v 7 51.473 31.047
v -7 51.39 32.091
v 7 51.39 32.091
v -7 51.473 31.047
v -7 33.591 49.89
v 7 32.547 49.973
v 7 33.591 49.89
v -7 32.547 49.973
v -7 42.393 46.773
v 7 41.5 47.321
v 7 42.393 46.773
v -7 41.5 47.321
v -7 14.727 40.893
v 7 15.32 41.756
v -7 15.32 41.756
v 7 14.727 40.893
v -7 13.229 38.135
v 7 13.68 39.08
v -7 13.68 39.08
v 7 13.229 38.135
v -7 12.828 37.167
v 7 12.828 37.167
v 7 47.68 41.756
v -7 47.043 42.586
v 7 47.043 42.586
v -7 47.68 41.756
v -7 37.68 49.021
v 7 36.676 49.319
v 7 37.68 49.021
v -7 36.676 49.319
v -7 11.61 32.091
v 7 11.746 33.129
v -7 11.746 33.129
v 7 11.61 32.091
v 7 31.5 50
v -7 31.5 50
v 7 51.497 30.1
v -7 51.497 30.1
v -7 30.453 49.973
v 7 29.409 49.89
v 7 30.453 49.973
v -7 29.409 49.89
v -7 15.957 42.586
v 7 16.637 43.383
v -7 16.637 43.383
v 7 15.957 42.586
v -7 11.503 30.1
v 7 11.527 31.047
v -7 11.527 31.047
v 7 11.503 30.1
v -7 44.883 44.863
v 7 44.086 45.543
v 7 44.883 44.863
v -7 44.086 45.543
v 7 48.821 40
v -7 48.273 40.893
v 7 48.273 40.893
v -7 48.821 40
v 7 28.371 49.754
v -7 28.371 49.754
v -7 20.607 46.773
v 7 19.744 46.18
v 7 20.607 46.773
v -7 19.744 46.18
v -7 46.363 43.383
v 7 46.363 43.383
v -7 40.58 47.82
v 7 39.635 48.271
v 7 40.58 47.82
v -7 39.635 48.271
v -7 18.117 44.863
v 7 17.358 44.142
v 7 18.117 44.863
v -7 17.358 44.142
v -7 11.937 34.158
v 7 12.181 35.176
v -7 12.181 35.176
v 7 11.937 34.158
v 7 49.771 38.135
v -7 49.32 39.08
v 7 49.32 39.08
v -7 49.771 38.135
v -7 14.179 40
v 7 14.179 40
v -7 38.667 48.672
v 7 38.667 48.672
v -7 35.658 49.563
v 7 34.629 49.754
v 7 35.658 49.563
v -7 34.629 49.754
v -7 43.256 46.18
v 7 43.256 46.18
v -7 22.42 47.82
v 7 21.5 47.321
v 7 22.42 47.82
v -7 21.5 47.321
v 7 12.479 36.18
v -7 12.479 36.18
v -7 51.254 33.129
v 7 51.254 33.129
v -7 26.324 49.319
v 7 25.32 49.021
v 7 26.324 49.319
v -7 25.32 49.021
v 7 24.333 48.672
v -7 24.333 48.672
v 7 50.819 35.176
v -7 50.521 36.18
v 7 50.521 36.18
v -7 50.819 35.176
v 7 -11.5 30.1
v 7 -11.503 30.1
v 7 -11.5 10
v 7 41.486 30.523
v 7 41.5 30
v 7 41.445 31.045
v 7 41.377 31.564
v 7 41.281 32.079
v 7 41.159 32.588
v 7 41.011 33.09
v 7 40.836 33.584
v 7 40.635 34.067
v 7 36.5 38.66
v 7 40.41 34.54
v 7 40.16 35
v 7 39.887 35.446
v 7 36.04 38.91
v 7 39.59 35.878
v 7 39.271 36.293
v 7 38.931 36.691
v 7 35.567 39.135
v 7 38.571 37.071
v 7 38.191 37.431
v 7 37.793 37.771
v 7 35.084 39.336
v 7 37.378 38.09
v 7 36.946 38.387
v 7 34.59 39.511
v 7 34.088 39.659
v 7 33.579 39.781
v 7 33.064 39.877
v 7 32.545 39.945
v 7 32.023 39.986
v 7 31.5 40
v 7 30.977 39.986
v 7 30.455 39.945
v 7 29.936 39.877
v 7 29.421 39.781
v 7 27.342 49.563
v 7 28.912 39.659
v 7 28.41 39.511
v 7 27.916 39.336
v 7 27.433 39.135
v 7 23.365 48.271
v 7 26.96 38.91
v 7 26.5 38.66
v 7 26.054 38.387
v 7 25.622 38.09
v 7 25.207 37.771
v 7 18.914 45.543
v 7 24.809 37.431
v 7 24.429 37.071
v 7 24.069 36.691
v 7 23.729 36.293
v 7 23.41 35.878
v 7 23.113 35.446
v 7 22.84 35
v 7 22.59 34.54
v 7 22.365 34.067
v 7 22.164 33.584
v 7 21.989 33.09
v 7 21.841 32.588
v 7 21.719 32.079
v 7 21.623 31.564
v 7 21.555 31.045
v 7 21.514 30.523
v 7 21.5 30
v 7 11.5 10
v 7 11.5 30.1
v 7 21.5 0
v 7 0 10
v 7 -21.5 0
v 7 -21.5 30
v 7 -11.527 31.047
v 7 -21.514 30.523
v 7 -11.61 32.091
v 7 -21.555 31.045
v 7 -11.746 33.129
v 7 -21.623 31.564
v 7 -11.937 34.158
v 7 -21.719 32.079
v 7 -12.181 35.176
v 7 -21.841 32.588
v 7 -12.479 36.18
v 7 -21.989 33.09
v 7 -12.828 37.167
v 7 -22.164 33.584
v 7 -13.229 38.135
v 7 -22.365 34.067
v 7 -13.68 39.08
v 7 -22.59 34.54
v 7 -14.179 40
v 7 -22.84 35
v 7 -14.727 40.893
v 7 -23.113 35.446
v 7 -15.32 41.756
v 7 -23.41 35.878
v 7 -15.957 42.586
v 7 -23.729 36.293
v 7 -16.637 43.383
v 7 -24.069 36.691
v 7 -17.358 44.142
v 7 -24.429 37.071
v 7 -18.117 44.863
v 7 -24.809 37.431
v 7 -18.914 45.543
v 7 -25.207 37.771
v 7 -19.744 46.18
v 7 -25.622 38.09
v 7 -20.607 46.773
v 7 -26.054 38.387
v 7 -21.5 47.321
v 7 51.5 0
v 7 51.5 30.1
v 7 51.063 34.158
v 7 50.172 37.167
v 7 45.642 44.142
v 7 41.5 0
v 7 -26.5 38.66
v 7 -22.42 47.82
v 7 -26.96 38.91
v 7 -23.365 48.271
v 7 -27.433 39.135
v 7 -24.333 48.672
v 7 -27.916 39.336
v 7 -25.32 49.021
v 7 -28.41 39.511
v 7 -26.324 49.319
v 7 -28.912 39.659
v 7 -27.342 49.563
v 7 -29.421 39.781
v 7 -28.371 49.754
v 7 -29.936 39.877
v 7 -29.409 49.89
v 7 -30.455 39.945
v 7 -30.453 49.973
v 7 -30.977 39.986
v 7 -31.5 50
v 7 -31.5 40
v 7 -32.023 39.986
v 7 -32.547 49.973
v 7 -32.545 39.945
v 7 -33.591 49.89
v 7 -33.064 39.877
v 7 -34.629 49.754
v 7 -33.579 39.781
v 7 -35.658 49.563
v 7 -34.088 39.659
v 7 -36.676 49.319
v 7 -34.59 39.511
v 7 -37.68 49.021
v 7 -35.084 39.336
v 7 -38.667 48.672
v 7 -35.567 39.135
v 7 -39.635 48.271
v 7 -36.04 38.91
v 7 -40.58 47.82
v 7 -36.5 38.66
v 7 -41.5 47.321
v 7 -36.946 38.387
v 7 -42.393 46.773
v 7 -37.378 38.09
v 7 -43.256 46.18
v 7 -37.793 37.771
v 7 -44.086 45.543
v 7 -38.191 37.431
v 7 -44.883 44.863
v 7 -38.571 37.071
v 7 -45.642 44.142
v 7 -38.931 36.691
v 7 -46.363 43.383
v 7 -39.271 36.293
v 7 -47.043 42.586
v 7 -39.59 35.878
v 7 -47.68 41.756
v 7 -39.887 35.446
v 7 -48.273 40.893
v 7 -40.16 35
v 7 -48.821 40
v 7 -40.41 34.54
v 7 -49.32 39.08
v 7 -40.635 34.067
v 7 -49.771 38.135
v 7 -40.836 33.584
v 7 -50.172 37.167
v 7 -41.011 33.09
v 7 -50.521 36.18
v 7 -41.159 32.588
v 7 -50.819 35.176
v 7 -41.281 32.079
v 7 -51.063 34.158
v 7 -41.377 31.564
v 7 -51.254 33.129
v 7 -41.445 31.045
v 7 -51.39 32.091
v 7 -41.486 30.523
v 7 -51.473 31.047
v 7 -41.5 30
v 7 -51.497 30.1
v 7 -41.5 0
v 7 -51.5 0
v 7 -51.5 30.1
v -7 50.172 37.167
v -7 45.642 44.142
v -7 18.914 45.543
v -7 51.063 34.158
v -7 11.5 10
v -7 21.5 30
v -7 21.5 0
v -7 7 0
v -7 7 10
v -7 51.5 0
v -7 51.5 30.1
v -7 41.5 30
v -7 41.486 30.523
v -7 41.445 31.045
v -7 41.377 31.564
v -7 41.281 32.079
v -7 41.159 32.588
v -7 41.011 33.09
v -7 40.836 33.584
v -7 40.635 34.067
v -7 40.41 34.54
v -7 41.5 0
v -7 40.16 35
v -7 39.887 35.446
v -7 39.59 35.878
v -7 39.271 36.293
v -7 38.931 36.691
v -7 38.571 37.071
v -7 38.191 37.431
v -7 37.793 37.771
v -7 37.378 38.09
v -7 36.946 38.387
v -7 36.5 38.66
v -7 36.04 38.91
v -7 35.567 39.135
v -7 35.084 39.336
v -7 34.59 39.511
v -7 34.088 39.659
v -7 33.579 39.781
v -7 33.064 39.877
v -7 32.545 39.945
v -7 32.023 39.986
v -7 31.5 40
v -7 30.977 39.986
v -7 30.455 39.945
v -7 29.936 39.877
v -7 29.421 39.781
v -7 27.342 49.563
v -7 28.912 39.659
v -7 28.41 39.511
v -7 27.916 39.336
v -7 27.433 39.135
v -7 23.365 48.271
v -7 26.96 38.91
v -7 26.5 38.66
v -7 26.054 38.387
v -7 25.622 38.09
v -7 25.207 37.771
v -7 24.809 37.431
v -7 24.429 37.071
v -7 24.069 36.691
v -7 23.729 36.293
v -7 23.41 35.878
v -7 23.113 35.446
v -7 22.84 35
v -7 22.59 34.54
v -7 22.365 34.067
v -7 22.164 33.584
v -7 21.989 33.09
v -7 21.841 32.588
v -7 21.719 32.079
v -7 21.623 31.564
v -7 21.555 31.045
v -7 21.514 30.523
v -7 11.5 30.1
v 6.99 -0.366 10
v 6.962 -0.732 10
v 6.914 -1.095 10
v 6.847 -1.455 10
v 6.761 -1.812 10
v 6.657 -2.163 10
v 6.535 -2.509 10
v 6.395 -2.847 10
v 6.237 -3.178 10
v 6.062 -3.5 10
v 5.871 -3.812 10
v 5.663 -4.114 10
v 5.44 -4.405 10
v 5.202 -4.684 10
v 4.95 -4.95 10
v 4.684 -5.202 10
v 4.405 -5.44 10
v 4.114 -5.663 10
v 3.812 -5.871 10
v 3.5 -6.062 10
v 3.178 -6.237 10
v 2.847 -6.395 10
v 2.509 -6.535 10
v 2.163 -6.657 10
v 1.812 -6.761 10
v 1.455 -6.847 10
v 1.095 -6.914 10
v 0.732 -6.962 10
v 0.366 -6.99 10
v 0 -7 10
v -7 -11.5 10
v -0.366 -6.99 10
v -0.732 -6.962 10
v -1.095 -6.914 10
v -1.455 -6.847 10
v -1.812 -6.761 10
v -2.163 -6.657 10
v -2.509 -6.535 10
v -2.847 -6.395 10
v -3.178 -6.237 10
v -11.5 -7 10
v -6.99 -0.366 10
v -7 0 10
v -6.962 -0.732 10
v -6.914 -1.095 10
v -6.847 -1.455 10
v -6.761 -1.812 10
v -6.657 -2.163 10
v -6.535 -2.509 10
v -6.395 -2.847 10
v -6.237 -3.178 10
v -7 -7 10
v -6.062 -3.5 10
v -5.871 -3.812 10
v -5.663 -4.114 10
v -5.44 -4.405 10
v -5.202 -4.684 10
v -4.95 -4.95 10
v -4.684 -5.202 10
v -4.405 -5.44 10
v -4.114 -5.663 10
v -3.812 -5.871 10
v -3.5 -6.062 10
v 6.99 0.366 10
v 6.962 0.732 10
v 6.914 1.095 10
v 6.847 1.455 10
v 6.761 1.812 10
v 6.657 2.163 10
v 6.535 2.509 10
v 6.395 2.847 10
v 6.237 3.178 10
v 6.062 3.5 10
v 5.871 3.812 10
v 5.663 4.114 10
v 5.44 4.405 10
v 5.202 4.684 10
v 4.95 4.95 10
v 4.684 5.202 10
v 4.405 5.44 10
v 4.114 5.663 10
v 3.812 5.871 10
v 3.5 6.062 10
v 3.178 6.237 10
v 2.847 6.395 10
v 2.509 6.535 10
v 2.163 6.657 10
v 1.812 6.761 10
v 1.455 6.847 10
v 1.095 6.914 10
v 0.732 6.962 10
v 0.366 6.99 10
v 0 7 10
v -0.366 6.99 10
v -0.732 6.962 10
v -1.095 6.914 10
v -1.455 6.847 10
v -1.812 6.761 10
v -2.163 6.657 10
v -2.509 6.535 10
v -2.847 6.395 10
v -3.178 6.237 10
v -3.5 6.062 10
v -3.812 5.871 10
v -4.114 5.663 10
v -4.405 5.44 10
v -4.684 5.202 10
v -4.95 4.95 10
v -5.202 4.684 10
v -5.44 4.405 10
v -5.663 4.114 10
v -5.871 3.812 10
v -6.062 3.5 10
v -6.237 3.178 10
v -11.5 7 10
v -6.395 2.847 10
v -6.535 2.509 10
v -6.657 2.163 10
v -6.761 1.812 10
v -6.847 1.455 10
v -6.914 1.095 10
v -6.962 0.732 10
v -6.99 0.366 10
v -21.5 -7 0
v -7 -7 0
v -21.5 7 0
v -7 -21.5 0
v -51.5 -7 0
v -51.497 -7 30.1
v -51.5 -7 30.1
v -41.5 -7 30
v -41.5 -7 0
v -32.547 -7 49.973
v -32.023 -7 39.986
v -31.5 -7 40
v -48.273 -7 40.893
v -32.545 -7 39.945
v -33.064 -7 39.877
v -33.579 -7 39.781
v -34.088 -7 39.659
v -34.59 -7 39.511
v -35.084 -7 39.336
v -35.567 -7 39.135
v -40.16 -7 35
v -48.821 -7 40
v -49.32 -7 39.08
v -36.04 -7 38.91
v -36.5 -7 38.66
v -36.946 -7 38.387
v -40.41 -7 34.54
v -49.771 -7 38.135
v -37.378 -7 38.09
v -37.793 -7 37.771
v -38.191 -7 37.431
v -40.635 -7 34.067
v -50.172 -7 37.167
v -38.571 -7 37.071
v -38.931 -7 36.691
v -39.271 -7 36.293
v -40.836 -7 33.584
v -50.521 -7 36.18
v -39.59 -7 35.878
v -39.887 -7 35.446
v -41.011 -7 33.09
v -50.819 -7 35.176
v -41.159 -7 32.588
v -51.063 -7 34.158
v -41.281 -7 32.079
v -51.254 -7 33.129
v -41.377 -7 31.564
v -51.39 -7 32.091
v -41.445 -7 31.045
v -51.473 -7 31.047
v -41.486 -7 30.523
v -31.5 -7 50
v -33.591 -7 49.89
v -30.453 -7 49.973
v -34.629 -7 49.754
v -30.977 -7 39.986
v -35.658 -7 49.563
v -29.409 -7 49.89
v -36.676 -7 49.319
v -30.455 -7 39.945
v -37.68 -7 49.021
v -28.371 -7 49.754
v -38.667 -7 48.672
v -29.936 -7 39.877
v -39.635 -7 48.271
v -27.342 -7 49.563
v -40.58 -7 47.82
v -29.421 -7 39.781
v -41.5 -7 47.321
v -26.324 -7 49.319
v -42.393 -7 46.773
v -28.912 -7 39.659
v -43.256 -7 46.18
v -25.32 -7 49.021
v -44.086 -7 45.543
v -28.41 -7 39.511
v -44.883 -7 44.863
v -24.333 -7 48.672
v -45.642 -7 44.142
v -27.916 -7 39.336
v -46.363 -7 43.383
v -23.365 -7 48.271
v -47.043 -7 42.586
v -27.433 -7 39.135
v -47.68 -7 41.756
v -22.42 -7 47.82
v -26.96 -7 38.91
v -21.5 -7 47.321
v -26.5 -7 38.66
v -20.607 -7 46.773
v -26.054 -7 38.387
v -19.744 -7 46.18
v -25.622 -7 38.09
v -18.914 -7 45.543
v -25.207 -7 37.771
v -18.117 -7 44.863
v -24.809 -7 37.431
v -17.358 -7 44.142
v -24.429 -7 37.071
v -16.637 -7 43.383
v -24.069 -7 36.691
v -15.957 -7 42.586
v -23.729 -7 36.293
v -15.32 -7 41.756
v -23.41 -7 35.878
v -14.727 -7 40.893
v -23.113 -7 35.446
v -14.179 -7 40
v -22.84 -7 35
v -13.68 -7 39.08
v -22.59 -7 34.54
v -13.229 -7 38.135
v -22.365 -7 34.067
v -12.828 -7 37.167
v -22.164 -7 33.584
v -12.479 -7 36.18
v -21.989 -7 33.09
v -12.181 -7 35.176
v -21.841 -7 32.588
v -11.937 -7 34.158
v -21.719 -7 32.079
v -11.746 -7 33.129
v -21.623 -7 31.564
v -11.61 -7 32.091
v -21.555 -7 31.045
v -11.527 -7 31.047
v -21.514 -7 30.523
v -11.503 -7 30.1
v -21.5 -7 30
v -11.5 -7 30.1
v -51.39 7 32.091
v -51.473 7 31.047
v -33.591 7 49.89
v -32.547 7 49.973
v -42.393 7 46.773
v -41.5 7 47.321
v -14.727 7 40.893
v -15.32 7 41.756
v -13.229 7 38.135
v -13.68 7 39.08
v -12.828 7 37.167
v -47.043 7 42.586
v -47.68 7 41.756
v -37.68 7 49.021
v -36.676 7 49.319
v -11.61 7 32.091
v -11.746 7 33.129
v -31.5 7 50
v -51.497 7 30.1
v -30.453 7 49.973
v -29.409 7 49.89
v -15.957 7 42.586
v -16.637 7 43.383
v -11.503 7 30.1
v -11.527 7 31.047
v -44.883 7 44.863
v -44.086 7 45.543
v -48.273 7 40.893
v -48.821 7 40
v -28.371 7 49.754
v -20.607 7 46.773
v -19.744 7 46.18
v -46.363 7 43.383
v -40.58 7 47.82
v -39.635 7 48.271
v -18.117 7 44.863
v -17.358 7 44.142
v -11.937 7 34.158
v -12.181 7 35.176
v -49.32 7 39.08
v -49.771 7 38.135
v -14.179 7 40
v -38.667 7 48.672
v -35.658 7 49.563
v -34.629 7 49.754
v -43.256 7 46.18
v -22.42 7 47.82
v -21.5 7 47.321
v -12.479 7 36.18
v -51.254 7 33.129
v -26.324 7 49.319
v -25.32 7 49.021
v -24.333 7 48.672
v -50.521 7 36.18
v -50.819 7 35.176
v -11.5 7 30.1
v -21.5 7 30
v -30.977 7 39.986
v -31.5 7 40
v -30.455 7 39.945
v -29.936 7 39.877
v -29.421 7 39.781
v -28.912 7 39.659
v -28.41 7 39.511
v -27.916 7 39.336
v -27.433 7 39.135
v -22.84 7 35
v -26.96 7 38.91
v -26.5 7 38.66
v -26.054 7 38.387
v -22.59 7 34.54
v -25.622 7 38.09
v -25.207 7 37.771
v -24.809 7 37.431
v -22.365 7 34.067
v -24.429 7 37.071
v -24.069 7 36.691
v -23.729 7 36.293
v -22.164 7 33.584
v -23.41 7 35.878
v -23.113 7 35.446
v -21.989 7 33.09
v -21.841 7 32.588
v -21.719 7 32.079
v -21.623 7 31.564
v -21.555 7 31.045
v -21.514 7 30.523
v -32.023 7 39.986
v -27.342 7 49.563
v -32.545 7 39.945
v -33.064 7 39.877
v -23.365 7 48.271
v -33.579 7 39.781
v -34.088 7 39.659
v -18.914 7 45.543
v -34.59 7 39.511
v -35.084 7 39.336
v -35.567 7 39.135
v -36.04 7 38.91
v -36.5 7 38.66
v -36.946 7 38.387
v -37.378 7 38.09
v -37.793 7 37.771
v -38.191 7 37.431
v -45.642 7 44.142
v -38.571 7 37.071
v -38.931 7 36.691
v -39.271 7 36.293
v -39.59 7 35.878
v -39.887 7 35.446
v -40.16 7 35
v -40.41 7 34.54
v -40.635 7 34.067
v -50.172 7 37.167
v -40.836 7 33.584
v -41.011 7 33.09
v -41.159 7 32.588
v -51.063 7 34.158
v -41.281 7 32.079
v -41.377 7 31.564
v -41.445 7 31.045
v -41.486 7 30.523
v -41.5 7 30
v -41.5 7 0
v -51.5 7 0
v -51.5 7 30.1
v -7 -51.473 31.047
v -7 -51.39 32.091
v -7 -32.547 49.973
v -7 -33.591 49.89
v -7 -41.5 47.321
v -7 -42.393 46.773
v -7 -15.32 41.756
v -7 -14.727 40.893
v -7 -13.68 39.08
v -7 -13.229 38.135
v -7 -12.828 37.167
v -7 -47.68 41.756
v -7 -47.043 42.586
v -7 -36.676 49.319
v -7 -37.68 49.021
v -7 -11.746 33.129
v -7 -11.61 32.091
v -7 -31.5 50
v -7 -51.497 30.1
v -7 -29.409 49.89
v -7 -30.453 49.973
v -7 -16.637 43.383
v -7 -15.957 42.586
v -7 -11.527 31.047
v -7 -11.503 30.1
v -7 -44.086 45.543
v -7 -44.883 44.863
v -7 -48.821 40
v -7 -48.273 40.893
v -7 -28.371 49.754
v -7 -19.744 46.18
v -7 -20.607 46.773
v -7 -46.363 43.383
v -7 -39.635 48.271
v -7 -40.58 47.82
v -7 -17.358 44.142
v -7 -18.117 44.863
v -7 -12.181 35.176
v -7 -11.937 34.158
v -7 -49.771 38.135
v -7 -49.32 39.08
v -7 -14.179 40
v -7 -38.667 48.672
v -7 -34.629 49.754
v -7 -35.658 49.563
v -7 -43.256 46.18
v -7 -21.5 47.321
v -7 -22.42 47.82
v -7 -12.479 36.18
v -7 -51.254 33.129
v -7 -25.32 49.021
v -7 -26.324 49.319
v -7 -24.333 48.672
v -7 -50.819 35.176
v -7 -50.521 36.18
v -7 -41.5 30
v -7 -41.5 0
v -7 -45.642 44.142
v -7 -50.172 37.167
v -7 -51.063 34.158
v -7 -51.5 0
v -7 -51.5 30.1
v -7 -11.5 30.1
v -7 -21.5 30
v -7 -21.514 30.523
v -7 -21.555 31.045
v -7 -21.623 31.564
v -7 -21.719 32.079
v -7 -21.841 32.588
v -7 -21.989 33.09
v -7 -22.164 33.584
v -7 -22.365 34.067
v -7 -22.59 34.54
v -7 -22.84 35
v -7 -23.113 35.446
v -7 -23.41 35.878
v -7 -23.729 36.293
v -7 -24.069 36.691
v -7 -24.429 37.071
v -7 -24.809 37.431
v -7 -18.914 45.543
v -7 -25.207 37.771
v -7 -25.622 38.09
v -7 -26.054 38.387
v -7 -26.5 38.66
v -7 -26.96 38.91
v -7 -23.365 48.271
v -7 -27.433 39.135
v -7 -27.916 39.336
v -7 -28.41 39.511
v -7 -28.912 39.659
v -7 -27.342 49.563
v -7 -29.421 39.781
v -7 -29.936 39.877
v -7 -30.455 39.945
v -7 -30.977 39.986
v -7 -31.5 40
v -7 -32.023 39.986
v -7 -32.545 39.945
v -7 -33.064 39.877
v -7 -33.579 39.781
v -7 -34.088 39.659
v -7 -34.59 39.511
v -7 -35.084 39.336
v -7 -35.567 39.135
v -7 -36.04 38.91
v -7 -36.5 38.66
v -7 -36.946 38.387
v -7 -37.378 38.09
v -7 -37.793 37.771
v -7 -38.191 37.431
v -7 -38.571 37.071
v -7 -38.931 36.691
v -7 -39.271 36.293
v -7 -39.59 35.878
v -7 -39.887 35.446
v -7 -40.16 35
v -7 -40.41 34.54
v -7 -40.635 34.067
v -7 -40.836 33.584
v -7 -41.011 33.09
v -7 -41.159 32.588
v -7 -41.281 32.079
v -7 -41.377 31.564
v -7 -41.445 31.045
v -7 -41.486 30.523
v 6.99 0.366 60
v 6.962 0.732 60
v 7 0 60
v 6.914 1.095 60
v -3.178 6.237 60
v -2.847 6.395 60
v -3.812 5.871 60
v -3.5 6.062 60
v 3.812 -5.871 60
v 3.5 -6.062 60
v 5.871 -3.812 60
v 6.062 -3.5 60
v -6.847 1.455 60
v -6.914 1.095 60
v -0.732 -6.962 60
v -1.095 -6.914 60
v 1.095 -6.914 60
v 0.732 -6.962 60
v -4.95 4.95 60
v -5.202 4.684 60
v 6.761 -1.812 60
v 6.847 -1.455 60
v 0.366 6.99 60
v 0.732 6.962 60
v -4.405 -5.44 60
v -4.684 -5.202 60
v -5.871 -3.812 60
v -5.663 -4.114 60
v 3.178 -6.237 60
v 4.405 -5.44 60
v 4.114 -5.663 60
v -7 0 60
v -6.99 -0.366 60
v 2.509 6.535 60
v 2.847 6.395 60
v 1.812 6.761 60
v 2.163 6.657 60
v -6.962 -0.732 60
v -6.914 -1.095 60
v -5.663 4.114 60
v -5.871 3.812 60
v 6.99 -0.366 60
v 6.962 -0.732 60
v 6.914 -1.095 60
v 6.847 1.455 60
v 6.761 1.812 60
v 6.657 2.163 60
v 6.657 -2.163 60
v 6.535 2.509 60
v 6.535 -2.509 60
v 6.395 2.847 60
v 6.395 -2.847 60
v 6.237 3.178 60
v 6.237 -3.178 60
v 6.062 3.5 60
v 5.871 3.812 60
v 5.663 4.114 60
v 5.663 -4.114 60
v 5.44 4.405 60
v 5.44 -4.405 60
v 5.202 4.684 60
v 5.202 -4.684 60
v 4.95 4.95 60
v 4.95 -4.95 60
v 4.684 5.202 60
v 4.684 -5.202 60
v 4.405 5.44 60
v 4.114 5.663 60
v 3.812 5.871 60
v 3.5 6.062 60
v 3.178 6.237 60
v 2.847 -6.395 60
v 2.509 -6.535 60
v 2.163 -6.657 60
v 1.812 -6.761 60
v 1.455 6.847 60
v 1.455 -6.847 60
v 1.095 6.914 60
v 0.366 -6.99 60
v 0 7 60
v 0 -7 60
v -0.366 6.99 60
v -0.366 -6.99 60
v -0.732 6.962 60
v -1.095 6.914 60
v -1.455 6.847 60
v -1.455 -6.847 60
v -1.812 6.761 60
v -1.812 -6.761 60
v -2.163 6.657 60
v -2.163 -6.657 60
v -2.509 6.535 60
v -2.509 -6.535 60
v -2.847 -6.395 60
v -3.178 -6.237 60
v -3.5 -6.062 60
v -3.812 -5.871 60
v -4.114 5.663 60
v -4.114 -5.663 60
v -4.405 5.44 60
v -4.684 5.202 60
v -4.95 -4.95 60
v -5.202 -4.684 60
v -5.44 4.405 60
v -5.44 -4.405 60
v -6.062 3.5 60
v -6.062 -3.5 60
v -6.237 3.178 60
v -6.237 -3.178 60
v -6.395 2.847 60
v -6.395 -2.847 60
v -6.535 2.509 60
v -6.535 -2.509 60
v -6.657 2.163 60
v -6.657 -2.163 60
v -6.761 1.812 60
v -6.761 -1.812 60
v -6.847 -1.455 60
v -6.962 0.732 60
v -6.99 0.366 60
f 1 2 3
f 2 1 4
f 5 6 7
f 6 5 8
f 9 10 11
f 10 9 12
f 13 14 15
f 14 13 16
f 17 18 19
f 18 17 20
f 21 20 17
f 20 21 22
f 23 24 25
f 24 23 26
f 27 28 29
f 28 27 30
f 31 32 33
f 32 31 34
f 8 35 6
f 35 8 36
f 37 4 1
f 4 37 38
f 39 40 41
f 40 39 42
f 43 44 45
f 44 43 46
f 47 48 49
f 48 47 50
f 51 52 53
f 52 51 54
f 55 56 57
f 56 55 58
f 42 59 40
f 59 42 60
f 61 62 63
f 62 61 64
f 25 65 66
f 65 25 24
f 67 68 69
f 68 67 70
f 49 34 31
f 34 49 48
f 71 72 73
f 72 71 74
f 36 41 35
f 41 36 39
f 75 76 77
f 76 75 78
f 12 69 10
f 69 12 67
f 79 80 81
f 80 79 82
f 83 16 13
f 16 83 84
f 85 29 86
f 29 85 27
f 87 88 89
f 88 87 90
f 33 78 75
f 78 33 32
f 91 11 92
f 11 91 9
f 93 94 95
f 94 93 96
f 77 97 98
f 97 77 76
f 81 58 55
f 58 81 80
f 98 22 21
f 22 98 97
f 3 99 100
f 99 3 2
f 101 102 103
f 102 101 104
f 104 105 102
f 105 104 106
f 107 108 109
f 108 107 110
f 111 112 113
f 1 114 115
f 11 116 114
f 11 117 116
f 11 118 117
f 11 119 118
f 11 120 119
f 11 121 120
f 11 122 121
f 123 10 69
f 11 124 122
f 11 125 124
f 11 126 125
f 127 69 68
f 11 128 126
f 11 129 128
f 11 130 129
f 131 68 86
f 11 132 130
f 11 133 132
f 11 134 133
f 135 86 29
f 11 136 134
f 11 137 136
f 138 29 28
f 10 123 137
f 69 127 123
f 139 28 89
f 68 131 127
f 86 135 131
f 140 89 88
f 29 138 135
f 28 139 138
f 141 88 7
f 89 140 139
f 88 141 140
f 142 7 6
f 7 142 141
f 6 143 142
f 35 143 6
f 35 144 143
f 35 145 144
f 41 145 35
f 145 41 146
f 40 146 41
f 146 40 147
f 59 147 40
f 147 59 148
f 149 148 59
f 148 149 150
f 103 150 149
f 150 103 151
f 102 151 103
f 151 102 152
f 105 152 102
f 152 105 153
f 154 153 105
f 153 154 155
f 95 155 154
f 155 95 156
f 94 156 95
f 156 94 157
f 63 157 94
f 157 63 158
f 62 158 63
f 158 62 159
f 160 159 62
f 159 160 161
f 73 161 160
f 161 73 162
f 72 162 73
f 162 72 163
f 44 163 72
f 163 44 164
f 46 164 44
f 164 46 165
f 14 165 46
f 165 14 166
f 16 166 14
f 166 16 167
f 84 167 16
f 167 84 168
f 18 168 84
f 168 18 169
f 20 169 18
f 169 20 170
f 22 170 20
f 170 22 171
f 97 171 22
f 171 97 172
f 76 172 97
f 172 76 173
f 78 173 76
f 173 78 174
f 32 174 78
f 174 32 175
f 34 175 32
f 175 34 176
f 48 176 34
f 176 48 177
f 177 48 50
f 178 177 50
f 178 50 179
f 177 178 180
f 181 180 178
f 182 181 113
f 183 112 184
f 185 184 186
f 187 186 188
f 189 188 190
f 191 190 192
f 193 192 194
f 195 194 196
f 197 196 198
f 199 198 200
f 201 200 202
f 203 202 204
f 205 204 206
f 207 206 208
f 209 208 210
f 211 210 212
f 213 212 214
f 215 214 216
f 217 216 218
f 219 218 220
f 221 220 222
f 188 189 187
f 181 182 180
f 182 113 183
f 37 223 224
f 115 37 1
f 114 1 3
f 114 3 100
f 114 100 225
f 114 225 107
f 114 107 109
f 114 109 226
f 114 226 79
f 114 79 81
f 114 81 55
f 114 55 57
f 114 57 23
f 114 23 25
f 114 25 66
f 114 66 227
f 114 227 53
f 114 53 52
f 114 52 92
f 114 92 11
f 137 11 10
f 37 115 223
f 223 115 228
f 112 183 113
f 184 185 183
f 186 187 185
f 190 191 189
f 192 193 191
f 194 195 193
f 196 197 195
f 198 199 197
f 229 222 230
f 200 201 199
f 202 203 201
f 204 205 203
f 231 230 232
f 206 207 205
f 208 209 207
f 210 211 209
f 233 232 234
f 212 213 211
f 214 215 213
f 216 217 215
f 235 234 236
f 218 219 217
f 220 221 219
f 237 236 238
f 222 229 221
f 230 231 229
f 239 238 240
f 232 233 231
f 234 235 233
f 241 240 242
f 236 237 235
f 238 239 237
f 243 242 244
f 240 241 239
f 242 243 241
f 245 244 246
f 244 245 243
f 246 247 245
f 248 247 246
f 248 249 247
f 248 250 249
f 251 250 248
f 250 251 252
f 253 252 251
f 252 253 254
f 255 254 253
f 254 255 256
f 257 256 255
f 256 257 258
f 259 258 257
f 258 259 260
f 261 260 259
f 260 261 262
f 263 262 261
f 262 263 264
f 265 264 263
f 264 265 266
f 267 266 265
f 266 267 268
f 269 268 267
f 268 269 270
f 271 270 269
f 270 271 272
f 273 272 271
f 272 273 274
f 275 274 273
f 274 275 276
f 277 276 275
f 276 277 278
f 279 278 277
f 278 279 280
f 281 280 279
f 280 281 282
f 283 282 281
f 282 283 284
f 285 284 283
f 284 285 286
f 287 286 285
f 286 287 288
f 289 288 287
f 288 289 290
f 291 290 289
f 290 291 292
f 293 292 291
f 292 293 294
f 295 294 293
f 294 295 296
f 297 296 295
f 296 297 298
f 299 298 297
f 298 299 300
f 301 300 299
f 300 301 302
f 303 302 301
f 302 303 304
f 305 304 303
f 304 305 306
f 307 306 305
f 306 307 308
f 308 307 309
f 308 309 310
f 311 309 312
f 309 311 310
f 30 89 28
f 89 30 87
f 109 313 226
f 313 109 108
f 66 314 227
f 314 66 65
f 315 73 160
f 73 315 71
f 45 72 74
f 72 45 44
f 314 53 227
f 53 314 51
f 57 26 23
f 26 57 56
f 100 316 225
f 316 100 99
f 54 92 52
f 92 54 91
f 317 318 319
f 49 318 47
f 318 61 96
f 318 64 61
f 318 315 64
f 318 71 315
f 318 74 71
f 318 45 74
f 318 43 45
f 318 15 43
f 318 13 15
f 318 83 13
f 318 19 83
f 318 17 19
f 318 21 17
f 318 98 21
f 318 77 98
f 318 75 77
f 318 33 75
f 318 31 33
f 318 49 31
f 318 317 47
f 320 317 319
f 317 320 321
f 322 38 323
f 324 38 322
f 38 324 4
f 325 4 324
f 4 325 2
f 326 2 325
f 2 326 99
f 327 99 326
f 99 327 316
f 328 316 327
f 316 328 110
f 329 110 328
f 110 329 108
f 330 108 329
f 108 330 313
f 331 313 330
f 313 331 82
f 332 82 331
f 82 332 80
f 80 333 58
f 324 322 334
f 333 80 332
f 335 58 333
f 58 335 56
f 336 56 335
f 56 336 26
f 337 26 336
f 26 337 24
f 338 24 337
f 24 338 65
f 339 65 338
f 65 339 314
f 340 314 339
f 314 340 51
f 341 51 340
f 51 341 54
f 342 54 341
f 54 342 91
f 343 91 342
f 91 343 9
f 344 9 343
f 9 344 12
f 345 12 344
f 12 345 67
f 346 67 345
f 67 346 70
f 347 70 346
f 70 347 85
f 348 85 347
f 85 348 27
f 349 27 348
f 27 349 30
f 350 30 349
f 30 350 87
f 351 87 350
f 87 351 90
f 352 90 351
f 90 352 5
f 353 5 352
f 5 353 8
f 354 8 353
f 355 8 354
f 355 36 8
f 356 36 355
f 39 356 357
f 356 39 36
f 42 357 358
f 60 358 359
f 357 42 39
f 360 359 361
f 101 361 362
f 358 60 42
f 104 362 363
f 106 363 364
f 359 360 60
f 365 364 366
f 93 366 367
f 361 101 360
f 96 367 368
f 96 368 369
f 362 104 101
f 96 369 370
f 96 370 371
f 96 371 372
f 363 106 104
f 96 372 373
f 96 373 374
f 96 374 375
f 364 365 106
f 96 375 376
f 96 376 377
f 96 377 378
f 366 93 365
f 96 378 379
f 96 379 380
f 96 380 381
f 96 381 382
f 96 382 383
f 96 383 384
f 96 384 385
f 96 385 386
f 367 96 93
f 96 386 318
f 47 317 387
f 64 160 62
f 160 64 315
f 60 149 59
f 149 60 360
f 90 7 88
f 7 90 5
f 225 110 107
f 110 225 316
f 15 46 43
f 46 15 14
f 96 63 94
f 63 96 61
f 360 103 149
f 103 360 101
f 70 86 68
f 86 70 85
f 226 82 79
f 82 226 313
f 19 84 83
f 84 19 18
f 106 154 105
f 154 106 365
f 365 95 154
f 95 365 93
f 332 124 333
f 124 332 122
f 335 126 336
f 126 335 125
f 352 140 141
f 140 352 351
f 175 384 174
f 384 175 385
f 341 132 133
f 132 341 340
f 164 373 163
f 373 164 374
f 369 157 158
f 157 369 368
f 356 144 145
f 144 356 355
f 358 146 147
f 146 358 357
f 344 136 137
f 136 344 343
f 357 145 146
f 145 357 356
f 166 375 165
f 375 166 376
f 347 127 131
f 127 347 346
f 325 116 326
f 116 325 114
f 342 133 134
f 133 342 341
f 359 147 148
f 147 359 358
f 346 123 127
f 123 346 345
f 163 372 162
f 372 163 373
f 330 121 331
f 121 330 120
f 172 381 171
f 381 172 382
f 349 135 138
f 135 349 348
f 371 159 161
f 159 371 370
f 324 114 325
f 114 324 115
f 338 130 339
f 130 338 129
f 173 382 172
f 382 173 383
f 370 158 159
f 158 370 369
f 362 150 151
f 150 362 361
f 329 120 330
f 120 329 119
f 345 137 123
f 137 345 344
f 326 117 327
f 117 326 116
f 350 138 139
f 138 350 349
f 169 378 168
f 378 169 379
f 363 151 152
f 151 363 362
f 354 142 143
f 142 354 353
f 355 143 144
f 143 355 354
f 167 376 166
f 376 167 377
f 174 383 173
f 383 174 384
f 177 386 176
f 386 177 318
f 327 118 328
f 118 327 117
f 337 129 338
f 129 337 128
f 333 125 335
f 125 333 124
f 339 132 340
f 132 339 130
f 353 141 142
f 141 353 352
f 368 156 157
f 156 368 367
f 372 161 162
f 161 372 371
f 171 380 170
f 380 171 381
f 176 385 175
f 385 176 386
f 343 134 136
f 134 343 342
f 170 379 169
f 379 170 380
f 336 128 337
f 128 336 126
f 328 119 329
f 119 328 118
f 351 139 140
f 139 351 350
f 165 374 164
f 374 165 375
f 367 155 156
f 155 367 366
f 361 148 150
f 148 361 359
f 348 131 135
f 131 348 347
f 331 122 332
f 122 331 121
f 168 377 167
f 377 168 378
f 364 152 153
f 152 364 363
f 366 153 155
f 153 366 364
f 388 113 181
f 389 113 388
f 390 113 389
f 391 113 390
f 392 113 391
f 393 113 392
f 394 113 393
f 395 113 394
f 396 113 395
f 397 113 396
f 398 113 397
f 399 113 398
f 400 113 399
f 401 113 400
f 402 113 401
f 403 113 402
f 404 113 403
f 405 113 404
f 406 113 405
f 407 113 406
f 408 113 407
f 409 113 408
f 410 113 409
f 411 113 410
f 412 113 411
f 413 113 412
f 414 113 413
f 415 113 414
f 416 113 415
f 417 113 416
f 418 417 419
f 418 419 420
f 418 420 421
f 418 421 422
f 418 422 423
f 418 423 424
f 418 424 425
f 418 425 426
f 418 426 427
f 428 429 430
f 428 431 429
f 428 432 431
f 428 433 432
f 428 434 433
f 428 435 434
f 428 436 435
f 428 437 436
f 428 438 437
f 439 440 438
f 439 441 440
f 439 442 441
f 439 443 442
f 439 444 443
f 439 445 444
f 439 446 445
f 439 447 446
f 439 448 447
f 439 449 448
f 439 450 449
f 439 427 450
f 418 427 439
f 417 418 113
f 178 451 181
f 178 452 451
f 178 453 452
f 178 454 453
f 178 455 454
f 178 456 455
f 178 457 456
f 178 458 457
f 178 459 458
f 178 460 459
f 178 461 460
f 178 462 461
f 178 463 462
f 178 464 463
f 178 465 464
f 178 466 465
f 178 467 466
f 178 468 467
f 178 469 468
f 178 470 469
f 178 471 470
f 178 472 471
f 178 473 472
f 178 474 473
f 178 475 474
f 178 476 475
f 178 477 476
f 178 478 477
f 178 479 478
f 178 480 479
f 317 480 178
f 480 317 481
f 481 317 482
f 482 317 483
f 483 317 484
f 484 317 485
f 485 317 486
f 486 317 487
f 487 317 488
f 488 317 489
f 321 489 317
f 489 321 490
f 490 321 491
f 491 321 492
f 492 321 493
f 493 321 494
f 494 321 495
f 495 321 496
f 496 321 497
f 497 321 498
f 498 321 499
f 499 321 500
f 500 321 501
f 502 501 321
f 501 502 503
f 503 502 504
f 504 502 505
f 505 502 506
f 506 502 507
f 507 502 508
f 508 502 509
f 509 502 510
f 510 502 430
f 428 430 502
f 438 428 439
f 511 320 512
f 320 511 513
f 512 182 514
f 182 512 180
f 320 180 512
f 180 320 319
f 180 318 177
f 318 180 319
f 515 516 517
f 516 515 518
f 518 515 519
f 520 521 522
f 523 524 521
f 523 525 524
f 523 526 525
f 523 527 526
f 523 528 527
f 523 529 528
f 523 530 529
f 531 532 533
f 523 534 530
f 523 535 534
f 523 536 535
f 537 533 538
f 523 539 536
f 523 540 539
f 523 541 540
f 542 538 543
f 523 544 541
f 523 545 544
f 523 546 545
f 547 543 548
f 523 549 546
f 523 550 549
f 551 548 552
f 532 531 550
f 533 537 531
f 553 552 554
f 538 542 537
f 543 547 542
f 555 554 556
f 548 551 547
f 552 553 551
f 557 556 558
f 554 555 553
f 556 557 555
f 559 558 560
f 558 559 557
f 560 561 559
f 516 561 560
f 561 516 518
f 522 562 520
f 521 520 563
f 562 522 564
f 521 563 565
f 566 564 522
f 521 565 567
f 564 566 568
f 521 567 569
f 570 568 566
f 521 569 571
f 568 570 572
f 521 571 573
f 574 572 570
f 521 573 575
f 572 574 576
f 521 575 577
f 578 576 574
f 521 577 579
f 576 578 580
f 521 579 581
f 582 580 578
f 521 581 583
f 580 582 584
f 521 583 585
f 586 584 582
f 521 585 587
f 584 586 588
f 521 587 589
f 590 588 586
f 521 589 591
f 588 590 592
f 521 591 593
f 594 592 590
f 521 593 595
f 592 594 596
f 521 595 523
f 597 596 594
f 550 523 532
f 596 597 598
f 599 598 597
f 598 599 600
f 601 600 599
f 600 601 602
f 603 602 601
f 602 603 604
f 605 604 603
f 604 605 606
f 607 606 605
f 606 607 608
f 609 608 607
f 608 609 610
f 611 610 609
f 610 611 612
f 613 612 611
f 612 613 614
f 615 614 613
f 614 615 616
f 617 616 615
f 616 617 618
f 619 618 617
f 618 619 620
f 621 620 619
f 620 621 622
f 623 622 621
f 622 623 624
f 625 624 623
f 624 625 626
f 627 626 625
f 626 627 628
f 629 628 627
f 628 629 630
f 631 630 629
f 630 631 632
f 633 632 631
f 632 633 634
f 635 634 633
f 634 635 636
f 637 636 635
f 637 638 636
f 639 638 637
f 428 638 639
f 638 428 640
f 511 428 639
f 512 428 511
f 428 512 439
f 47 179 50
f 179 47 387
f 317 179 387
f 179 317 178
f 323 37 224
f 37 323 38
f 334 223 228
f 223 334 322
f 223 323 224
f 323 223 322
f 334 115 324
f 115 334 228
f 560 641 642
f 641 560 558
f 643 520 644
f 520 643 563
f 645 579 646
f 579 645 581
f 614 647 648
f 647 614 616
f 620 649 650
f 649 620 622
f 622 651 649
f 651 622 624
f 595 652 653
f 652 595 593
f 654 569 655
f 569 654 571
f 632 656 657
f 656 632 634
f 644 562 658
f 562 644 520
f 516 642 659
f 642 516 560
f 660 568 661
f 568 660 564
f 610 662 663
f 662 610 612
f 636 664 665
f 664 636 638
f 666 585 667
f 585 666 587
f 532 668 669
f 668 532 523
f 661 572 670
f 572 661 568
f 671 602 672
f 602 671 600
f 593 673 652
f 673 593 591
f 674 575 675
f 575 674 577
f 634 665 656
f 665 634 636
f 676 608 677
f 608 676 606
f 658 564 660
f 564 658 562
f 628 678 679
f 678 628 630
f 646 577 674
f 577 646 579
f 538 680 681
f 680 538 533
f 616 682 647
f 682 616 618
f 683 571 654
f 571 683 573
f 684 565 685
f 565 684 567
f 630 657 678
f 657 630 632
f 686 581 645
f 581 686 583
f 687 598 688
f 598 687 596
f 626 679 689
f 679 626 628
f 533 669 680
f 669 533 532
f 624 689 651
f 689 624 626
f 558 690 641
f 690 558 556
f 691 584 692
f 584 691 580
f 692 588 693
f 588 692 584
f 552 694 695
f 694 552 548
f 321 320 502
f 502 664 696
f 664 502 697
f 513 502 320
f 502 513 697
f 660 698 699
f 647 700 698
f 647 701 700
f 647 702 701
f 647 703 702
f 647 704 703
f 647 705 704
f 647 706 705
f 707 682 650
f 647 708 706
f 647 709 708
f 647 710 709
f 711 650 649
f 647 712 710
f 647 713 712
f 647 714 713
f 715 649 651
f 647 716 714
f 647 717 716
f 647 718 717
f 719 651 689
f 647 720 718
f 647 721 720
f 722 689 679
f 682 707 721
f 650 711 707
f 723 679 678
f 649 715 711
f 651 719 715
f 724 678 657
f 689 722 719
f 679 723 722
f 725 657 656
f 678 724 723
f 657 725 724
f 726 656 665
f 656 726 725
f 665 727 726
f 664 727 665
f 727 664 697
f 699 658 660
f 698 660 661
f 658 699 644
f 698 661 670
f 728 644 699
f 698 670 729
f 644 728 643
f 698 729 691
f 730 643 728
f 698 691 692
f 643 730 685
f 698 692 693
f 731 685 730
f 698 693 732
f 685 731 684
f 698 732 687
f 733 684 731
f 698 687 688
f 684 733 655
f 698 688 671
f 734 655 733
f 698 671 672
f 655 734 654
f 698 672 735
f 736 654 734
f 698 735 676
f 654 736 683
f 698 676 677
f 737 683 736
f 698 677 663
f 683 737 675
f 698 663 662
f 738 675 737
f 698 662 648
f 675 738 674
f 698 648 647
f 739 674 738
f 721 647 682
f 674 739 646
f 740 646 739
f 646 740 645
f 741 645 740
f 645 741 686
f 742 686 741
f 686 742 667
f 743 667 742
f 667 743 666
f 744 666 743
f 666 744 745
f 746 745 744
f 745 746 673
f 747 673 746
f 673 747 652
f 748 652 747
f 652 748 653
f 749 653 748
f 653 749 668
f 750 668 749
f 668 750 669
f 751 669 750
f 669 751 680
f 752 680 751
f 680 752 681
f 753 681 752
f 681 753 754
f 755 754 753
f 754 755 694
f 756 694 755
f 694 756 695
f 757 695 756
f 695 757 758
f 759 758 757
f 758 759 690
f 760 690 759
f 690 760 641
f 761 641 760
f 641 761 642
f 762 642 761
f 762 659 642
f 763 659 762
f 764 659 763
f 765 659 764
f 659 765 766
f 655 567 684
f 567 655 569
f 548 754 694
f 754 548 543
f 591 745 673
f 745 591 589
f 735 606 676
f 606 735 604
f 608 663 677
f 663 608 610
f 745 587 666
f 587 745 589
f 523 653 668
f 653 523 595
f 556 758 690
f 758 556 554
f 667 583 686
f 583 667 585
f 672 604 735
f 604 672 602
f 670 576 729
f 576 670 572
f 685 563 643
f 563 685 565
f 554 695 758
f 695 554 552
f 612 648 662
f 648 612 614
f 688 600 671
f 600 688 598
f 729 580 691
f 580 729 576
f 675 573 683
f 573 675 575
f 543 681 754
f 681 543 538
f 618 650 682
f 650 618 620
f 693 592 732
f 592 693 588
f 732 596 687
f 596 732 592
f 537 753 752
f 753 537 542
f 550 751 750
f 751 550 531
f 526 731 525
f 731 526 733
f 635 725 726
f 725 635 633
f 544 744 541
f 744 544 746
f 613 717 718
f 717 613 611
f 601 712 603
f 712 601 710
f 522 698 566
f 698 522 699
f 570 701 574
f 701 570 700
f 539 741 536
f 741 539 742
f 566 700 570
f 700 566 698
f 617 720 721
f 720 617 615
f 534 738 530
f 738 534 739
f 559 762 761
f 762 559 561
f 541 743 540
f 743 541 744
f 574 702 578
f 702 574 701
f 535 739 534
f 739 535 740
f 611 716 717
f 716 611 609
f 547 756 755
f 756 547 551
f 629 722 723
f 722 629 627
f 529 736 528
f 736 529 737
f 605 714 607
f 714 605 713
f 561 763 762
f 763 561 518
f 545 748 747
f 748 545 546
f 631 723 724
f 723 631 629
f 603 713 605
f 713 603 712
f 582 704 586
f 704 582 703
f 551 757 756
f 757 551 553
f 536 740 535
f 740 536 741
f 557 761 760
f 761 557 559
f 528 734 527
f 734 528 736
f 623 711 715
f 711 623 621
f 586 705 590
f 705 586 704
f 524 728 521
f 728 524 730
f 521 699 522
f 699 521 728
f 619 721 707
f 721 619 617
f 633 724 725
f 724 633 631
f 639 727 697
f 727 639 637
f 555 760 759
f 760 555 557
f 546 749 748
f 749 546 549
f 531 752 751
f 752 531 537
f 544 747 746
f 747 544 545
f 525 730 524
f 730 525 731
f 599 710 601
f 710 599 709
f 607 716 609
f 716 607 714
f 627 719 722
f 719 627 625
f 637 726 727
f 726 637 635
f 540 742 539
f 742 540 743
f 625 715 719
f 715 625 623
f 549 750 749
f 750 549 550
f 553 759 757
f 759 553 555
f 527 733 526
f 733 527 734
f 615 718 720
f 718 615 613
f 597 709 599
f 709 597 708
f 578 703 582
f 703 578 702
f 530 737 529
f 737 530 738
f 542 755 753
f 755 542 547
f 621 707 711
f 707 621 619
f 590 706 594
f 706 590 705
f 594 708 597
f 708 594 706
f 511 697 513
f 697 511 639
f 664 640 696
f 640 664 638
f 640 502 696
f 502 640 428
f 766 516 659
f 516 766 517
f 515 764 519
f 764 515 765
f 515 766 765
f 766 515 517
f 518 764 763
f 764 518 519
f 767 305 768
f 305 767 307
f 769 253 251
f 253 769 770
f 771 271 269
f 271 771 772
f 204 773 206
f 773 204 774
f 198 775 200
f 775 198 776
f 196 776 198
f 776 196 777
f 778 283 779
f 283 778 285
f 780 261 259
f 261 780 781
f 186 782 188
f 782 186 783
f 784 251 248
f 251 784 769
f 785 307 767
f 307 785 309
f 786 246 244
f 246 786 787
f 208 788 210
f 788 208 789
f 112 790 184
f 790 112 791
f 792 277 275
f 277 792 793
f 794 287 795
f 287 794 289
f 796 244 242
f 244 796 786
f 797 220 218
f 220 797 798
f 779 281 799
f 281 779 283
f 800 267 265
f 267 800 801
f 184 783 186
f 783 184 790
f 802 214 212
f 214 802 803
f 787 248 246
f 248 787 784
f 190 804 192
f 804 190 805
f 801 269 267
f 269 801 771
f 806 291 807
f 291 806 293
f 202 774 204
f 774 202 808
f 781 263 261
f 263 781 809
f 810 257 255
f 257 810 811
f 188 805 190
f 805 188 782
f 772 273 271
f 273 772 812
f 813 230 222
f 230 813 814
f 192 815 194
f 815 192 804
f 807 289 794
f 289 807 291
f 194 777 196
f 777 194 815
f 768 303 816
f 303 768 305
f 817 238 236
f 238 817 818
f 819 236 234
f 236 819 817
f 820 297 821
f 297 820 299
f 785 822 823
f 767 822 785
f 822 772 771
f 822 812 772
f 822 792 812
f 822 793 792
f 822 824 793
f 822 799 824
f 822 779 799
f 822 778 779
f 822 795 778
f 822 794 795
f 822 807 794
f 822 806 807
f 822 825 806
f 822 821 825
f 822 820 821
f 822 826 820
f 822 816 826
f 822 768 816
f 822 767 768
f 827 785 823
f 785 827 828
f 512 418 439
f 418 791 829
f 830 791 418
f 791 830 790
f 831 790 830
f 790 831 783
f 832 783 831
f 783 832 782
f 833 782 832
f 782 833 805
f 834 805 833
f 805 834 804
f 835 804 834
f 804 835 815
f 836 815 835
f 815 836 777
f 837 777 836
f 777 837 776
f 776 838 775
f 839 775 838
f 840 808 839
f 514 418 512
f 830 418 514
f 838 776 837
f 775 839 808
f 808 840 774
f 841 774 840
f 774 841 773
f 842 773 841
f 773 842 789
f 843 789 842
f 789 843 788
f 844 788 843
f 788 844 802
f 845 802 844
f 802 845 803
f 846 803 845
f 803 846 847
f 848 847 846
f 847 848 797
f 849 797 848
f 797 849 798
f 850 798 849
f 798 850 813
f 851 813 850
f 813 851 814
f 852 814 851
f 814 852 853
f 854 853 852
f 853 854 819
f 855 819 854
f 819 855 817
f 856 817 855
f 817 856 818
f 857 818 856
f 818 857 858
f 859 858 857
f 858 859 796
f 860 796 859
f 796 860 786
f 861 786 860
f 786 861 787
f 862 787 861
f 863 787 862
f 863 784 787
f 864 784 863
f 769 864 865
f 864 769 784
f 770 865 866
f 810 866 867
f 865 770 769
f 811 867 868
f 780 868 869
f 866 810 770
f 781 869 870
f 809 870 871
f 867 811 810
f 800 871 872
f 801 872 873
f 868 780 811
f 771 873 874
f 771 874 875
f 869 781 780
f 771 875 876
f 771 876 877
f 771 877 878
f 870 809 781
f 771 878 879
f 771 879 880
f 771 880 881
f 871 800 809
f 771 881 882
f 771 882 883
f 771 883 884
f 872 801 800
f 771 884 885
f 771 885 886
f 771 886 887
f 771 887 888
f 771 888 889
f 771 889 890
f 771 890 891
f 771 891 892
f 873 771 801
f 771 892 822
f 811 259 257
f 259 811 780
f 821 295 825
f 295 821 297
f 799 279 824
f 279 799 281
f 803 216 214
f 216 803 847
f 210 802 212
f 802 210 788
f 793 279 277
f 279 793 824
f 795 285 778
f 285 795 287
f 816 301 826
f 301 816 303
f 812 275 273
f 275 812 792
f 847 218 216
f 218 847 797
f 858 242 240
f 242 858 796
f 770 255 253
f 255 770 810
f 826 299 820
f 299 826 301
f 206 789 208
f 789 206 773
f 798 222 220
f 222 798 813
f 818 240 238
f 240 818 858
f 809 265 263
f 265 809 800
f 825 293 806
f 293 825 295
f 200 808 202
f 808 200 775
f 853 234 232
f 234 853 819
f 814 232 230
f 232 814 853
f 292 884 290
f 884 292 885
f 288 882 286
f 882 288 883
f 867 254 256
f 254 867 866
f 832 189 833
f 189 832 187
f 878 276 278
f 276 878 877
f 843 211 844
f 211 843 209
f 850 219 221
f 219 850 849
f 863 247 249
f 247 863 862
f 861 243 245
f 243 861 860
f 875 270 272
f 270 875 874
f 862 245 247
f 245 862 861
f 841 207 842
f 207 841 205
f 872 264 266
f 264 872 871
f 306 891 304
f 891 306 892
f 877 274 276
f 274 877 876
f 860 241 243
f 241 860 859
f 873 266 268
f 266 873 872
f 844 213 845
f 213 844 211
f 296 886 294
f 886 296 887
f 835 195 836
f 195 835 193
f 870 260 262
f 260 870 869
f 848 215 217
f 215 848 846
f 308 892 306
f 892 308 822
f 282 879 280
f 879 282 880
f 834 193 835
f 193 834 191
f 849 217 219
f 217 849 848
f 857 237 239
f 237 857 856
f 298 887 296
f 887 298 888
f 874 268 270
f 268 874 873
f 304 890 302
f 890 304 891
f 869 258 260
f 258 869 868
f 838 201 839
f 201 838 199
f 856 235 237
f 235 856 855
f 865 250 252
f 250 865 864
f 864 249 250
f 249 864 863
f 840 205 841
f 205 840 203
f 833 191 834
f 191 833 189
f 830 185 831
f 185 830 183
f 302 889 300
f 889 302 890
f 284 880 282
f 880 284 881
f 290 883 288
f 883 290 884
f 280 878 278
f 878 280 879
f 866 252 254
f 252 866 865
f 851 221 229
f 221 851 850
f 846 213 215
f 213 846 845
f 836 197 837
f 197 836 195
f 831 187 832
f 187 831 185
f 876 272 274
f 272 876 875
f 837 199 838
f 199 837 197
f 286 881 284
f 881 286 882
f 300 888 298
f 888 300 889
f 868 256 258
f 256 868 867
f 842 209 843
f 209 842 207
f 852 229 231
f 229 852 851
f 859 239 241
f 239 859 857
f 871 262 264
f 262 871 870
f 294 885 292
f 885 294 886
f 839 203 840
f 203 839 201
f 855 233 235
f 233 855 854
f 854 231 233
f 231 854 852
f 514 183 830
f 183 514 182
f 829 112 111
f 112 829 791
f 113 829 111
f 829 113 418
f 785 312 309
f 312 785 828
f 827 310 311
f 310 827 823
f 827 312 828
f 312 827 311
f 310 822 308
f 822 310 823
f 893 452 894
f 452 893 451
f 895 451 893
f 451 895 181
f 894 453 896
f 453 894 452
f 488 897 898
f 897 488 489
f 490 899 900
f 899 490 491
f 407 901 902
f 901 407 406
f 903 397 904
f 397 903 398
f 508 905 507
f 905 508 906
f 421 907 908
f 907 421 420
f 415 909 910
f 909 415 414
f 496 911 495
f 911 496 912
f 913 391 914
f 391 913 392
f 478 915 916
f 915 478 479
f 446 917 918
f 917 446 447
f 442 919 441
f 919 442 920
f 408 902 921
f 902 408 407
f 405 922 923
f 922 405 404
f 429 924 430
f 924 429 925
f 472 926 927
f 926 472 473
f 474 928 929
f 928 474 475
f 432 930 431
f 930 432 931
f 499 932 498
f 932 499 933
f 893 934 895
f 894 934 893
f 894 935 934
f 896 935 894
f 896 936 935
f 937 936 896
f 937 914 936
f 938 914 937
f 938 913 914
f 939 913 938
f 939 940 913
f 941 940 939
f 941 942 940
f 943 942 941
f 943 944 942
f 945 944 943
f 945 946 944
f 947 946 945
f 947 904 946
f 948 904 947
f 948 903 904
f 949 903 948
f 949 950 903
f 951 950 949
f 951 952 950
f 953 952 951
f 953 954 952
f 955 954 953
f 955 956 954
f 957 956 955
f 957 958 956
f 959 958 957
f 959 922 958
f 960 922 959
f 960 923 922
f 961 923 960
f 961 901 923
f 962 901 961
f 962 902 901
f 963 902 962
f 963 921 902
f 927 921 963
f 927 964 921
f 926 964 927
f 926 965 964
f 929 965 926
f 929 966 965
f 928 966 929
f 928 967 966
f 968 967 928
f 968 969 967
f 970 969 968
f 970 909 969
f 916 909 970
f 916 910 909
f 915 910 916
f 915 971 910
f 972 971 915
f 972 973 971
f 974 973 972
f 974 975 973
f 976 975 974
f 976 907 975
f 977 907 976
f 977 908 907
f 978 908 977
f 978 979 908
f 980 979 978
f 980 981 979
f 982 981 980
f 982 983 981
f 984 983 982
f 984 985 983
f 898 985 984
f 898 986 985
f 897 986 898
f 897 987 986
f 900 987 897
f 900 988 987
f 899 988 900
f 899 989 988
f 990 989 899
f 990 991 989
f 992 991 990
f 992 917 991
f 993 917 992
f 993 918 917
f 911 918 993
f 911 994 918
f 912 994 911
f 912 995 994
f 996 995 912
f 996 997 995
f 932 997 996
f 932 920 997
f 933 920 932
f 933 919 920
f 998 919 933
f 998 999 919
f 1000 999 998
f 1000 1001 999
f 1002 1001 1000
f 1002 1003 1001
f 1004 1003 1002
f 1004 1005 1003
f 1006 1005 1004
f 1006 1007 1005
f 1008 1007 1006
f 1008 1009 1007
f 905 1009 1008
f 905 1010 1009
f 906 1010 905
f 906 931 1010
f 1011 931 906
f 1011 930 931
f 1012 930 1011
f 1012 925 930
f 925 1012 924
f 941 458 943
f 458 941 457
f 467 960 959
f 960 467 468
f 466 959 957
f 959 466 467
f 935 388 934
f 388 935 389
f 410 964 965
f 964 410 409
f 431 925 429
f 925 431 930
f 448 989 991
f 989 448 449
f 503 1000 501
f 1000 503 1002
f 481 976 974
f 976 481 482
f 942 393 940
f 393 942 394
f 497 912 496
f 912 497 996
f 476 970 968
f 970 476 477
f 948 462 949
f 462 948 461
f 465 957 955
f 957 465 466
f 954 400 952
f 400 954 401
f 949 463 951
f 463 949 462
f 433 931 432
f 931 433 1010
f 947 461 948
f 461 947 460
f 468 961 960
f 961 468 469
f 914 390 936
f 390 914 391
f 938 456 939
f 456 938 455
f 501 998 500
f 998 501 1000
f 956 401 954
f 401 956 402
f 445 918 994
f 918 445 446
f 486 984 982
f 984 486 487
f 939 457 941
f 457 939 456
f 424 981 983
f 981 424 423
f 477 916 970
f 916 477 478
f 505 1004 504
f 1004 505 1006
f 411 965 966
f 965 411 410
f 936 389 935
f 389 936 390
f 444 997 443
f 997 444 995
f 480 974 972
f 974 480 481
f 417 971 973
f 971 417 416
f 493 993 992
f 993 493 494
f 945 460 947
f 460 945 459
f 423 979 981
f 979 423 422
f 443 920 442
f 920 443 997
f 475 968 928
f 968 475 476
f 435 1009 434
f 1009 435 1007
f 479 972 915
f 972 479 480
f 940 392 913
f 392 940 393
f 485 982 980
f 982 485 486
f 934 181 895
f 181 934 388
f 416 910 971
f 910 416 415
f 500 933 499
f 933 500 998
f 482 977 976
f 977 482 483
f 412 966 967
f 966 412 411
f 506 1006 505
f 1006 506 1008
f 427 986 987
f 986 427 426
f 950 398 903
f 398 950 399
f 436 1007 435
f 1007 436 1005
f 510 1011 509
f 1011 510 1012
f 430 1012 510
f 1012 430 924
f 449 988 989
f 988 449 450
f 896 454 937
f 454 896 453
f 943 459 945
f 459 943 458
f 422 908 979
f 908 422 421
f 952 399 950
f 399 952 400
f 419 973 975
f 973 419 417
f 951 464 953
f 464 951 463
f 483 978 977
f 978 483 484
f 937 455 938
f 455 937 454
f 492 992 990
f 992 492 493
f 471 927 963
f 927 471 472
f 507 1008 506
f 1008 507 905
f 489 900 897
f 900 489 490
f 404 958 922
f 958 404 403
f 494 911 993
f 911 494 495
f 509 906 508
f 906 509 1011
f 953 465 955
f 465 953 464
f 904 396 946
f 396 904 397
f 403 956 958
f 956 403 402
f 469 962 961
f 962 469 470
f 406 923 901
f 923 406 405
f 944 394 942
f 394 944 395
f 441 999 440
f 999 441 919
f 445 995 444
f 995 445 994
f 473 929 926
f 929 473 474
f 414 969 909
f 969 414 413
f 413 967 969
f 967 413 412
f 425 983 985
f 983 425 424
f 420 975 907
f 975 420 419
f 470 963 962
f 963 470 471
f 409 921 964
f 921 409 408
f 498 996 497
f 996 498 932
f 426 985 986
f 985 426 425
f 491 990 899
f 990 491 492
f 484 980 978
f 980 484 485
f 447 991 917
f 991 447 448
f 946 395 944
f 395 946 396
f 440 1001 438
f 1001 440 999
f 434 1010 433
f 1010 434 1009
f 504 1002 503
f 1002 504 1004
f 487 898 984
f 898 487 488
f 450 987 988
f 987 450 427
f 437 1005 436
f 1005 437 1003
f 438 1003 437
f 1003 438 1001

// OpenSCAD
module coathook(fn,basediameter,distance,hookthickness,hookdiameter) {
	union() {
		cylinder(r=basediameter / 2, h=60, $fn=fn); //Base to insert on the board.
		for(angle = [0 : 90 : 180]) { //Each of the 3 hooks.
			rotate([0, 0, angle]) {
				translate([-basediameter / 2, -basediameter / 2, 0]) {
					union() {
						cube([basediameter, basediameter + distance + hookthickness, 10]); //Connector to the hook.
						translate([0, basediameter + distance, 0]) {
							cube([basediameter, hookthickness, 30.1]); //Hook going up.
						}
						translate([0,basediameter + distance + hookthickness + hookdiameter,0]) {
							cube([basediameter, hookthickness, 30.1]); //Hook going down.
						}
						translate([0, basediameter + distance + hookthickness + hookdiameter / 2, 30]) {
							rotate([0, 90, 0]) {
								difference() { //Curve from up to down.
									cylinder(r=hookdiameter / 2 + hookthickness, h=basediameter,$fn=fn);
									cylinder(r=hookdiameter / 2, h=basediameter, $fn=fn); //Cut out the infill from the cylinder to produce a curve.
									translate([0,-hookdiameter / 2 - hookthickness, 0]) {
										cube([hookdiameter / 2 + hookthickness, hookthickness * 2 + hookdiameter, basediameter]); //Cut off the bottom half.
									}
								}
							}
						}
					}
				}
			}
		}
	}
}

coathook(fn=120, basediameter = 14, distance=4.5, hookthickness=10, hookdiameter=20);
